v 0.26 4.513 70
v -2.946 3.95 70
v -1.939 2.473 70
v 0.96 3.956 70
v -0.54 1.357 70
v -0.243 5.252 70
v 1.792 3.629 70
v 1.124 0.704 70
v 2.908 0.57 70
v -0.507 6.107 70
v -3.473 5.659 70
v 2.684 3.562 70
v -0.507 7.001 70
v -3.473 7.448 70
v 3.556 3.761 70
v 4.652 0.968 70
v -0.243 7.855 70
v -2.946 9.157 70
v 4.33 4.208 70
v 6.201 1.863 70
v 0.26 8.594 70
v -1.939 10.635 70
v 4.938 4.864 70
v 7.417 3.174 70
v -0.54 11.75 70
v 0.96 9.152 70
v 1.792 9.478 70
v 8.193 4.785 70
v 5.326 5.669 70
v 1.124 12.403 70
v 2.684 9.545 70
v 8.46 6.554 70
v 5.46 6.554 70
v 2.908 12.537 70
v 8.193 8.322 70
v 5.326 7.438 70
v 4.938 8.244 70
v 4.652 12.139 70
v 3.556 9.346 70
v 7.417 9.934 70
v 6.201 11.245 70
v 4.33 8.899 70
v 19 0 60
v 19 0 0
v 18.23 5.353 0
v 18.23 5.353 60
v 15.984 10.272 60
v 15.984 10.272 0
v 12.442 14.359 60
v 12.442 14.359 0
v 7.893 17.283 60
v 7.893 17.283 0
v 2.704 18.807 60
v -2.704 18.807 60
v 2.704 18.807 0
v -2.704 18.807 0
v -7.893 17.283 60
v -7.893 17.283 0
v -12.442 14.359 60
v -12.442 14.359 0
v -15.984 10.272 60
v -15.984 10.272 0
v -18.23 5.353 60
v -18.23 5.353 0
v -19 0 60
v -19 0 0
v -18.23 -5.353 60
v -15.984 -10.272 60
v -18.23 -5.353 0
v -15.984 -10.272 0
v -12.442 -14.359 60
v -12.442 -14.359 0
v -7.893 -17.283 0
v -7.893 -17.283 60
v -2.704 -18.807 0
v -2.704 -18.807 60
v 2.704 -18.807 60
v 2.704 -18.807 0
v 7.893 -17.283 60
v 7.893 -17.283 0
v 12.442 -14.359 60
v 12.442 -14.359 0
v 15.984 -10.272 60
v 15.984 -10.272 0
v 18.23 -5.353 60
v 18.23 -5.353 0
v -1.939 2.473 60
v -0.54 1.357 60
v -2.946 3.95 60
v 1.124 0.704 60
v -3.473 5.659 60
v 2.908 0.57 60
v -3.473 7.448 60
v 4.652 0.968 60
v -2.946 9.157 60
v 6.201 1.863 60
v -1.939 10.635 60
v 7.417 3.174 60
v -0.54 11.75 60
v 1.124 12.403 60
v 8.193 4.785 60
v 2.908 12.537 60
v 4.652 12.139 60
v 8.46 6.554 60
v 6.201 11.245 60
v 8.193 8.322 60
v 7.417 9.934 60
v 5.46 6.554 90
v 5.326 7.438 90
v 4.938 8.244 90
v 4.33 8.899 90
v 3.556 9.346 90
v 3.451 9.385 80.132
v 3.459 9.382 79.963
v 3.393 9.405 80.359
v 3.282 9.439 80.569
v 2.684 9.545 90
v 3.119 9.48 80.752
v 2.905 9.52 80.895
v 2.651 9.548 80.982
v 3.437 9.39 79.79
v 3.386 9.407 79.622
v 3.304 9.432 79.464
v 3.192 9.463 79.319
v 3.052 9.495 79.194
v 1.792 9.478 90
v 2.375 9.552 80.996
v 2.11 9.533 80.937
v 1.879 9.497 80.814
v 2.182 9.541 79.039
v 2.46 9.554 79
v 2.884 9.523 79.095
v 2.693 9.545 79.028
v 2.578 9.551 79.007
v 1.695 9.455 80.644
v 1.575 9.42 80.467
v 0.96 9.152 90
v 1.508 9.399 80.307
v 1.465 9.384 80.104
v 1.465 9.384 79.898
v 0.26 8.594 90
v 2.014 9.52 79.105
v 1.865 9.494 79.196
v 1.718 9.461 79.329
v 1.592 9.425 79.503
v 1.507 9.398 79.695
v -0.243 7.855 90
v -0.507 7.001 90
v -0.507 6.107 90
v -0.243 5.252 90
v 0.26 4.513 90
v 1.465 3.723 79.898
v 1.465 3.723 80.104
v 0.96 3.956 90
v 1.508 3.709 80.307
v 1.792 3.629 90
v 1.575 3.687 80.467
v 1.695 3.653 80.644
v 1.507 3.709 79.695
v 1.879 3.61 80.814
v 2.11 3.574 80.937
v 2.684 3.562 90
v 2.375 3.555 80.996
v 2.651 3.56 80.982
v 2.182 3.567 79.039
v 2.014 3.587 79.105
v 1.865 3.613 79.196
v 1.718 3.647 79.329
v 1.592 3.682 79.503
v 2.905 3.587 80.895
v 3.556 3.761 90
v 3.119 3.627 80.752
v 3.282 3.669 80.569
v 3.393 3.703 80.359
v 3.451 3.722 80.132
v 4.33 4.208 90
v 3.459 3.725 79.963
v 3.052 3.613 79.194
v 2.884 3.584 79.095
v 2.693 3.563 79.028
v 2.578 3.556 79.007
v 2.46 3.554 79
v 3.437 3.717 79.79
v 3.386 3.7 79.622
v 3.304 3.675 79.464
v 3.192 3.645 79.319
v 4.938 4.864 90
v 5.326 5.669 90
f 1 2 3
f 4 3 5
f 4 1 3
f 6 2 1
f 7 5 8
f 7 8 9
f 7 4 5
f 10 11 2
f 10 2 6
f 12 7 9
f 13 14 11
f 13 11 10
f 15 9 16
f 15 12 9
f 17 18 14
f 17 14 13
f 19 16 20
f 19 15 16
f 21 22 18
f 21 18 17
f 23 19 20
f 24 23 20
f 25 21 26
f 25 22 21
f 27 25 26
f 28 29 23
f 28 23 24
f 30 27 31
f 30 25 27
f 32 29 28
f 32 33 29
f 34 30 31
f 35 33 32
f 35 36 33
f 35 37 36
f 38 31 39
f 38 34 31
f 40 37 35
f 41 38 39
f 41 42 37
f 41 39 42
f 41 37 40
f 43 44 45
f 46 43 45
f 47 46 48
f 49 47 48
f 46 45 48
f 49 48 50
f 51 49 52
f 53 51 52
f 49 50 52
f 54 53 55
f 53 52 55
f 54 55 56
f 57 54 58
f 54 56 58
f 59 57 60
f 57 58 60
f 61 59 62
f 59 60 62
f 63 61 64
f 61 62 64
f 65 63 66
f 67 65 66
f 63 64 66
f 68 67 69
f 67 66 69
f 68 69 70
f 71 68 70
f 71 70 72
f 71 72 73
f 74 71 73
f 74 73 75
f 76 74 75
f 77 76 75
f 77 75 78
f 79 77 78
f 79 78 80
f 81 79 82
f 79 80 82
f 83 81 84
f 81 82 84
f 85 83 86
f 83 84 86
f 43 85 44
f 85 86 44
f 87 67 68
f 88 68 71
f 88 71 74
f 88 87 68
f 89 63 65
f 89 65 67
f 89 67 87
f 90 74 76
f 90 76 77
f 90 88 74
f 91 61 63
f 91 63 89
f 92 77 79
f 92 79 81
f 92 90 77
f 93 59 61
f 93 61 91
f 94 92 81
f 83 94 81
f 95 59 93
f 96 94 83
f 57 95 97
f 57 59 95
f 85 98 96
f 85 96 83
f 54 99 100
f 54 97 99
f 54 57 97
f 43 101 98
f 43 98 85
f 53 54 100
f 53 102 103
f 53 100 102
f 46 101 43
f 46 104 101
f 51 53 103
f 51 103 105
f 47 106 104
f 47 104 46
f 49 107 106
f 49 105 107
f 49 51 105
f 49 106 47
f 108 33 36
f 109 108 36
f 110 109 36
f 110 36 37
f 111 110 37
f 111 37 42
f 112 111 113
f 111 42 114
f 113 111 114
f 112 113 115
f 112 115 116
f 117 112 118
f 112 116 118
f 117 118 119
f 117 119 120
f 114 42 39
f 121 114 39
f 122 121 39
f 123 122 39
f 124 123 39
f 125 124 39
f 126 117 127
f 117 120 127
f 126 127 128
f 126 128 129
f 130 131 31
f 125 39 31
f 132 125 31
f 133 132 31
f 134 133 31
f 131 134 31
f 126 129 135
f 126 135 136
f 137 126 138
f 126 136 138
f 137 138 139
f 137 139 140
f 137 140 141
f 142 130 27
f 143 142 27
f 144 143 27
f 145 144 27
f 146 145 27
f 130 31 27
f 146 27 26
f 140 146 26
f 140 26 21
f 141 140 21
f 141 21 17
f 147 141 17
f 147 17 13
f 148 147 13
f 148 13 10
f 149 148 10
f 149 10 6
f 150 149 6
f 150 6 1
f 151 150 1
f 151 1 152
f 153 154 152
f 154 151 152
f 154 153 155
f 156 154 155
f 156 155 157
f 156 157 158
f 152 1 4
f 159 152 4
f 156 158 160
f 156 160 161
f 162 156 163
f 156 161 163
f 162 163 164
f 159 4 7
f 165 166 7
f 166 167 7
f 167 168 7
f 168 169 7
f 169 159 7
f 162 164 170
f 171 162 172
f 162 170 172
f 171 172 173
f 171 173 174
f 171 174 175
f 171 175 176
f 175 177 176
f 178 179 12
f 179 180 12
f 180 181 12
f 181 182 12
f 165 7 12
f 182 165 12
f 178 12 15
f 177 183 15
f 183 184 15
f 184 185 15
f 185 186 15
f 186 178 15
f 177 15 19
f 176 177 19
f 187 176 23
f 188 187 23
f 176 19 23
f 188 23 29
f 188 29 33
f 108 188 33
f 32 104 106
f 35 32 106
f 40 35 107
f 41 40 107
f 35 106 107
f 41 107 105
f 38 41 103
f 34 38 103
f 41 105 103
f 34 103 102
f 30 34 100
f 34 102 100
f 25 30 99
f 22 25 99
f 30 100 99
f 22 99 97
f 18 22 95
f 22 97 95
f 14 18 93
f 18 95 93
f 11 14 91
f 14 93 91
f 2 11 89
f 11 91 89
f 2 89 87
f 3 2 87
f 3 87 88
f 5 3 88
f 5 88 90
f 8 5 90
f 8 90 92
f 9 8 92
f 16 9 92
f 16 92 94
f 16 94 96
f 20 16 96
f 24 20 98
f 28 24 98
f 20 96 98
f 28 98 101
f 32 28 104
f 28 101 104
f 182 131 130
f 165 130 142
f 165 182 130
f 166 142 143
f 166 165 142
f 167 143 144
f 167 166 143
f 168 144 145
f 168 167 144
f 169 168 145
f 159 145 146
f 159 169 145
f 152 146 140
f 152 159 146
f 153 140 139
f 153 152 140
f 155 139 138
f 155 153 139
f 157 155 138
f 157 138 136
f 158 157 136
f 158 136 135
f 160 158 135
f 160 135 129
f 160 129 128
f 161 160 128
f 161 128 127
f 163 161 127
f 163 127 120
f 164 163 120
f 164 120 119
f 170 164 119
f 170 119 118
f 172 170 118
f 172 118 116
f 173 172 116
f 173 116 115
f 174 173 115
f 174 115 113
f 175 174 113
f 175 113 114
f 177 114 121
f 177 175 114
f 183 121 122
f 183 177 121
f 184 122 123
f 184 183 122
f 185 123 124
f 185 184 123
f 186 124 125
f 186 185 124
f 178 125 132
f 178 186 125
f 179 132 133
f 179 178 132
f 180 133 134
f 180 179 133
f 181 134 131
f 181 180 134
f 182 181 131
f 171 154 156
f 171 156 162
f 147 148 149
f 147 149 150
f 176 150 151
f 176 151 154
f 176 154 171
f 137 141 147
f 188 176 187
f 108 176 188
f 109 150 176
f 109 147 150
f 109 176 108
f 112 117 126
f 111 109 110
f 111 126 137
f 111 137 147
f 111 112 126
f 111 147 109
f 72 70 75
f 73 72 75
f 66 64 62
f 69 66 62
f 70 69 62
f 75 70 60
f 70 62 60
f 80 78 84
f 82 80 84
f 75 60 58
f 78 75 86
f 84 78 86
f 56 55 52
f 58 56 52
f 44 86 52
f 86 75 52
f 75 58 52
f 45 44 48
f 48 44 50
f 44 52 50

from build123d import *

# Parameters (mm, degrees)
SKETCH1_R             = 19
MOTOR_MACHINERY_DEPTH = 60
SKETCH2_R             = 6
BOSS_EXTRUDE2_DEPTH   = 10
SKETCH5_R             = 3
MOTOR_SHAFT_DEPTH     = 20
SKETCH7_R             = 1
HUB_HOLES_DEPTH       = 20


with BuildPart() as part:
    # Sketch1 → motor machinery (new body)
    with BuildSketch(Plane.XY):
        Circle(SKETCH1_R)
    extrude(amount=MOTOR_MACHINERY_DEPTH)

    # Sketch2 → Boss-Extrude2 (add)
    with BuildSketch(Plane.XY.offset(60)):
        with Locations((2.459603008, 6.553651886)):
            Circle(SKETCH2_R)
    extrude(amount=BOSS_EXTRUDE2_DEPTH)

    # Sketch5 → motor shaft (add)
    with BuildSketch(Plane.XY.offset(70)):
        with Locations((2.459603008, 6.553651886)):
            Circle(SKETCH5_R)
    extrude(amount=MOTOR_SHAFT_DEPTH)

    # Sketch7 → hub holes (cut)
    with BuildSketch(Plane(origin=(0, 0, 0), x_dir=(1, 0, 0), z_dir=(0, 1, 0))):
        with Locations(Location((2.459603008, -80, 0), (0, 0, 90))):
            Circle(SKETCH7_R)
    extrude(amount=HUB_HOLES_DEPTH, mode=Mode.SUBTRACT)


solid = part.part
